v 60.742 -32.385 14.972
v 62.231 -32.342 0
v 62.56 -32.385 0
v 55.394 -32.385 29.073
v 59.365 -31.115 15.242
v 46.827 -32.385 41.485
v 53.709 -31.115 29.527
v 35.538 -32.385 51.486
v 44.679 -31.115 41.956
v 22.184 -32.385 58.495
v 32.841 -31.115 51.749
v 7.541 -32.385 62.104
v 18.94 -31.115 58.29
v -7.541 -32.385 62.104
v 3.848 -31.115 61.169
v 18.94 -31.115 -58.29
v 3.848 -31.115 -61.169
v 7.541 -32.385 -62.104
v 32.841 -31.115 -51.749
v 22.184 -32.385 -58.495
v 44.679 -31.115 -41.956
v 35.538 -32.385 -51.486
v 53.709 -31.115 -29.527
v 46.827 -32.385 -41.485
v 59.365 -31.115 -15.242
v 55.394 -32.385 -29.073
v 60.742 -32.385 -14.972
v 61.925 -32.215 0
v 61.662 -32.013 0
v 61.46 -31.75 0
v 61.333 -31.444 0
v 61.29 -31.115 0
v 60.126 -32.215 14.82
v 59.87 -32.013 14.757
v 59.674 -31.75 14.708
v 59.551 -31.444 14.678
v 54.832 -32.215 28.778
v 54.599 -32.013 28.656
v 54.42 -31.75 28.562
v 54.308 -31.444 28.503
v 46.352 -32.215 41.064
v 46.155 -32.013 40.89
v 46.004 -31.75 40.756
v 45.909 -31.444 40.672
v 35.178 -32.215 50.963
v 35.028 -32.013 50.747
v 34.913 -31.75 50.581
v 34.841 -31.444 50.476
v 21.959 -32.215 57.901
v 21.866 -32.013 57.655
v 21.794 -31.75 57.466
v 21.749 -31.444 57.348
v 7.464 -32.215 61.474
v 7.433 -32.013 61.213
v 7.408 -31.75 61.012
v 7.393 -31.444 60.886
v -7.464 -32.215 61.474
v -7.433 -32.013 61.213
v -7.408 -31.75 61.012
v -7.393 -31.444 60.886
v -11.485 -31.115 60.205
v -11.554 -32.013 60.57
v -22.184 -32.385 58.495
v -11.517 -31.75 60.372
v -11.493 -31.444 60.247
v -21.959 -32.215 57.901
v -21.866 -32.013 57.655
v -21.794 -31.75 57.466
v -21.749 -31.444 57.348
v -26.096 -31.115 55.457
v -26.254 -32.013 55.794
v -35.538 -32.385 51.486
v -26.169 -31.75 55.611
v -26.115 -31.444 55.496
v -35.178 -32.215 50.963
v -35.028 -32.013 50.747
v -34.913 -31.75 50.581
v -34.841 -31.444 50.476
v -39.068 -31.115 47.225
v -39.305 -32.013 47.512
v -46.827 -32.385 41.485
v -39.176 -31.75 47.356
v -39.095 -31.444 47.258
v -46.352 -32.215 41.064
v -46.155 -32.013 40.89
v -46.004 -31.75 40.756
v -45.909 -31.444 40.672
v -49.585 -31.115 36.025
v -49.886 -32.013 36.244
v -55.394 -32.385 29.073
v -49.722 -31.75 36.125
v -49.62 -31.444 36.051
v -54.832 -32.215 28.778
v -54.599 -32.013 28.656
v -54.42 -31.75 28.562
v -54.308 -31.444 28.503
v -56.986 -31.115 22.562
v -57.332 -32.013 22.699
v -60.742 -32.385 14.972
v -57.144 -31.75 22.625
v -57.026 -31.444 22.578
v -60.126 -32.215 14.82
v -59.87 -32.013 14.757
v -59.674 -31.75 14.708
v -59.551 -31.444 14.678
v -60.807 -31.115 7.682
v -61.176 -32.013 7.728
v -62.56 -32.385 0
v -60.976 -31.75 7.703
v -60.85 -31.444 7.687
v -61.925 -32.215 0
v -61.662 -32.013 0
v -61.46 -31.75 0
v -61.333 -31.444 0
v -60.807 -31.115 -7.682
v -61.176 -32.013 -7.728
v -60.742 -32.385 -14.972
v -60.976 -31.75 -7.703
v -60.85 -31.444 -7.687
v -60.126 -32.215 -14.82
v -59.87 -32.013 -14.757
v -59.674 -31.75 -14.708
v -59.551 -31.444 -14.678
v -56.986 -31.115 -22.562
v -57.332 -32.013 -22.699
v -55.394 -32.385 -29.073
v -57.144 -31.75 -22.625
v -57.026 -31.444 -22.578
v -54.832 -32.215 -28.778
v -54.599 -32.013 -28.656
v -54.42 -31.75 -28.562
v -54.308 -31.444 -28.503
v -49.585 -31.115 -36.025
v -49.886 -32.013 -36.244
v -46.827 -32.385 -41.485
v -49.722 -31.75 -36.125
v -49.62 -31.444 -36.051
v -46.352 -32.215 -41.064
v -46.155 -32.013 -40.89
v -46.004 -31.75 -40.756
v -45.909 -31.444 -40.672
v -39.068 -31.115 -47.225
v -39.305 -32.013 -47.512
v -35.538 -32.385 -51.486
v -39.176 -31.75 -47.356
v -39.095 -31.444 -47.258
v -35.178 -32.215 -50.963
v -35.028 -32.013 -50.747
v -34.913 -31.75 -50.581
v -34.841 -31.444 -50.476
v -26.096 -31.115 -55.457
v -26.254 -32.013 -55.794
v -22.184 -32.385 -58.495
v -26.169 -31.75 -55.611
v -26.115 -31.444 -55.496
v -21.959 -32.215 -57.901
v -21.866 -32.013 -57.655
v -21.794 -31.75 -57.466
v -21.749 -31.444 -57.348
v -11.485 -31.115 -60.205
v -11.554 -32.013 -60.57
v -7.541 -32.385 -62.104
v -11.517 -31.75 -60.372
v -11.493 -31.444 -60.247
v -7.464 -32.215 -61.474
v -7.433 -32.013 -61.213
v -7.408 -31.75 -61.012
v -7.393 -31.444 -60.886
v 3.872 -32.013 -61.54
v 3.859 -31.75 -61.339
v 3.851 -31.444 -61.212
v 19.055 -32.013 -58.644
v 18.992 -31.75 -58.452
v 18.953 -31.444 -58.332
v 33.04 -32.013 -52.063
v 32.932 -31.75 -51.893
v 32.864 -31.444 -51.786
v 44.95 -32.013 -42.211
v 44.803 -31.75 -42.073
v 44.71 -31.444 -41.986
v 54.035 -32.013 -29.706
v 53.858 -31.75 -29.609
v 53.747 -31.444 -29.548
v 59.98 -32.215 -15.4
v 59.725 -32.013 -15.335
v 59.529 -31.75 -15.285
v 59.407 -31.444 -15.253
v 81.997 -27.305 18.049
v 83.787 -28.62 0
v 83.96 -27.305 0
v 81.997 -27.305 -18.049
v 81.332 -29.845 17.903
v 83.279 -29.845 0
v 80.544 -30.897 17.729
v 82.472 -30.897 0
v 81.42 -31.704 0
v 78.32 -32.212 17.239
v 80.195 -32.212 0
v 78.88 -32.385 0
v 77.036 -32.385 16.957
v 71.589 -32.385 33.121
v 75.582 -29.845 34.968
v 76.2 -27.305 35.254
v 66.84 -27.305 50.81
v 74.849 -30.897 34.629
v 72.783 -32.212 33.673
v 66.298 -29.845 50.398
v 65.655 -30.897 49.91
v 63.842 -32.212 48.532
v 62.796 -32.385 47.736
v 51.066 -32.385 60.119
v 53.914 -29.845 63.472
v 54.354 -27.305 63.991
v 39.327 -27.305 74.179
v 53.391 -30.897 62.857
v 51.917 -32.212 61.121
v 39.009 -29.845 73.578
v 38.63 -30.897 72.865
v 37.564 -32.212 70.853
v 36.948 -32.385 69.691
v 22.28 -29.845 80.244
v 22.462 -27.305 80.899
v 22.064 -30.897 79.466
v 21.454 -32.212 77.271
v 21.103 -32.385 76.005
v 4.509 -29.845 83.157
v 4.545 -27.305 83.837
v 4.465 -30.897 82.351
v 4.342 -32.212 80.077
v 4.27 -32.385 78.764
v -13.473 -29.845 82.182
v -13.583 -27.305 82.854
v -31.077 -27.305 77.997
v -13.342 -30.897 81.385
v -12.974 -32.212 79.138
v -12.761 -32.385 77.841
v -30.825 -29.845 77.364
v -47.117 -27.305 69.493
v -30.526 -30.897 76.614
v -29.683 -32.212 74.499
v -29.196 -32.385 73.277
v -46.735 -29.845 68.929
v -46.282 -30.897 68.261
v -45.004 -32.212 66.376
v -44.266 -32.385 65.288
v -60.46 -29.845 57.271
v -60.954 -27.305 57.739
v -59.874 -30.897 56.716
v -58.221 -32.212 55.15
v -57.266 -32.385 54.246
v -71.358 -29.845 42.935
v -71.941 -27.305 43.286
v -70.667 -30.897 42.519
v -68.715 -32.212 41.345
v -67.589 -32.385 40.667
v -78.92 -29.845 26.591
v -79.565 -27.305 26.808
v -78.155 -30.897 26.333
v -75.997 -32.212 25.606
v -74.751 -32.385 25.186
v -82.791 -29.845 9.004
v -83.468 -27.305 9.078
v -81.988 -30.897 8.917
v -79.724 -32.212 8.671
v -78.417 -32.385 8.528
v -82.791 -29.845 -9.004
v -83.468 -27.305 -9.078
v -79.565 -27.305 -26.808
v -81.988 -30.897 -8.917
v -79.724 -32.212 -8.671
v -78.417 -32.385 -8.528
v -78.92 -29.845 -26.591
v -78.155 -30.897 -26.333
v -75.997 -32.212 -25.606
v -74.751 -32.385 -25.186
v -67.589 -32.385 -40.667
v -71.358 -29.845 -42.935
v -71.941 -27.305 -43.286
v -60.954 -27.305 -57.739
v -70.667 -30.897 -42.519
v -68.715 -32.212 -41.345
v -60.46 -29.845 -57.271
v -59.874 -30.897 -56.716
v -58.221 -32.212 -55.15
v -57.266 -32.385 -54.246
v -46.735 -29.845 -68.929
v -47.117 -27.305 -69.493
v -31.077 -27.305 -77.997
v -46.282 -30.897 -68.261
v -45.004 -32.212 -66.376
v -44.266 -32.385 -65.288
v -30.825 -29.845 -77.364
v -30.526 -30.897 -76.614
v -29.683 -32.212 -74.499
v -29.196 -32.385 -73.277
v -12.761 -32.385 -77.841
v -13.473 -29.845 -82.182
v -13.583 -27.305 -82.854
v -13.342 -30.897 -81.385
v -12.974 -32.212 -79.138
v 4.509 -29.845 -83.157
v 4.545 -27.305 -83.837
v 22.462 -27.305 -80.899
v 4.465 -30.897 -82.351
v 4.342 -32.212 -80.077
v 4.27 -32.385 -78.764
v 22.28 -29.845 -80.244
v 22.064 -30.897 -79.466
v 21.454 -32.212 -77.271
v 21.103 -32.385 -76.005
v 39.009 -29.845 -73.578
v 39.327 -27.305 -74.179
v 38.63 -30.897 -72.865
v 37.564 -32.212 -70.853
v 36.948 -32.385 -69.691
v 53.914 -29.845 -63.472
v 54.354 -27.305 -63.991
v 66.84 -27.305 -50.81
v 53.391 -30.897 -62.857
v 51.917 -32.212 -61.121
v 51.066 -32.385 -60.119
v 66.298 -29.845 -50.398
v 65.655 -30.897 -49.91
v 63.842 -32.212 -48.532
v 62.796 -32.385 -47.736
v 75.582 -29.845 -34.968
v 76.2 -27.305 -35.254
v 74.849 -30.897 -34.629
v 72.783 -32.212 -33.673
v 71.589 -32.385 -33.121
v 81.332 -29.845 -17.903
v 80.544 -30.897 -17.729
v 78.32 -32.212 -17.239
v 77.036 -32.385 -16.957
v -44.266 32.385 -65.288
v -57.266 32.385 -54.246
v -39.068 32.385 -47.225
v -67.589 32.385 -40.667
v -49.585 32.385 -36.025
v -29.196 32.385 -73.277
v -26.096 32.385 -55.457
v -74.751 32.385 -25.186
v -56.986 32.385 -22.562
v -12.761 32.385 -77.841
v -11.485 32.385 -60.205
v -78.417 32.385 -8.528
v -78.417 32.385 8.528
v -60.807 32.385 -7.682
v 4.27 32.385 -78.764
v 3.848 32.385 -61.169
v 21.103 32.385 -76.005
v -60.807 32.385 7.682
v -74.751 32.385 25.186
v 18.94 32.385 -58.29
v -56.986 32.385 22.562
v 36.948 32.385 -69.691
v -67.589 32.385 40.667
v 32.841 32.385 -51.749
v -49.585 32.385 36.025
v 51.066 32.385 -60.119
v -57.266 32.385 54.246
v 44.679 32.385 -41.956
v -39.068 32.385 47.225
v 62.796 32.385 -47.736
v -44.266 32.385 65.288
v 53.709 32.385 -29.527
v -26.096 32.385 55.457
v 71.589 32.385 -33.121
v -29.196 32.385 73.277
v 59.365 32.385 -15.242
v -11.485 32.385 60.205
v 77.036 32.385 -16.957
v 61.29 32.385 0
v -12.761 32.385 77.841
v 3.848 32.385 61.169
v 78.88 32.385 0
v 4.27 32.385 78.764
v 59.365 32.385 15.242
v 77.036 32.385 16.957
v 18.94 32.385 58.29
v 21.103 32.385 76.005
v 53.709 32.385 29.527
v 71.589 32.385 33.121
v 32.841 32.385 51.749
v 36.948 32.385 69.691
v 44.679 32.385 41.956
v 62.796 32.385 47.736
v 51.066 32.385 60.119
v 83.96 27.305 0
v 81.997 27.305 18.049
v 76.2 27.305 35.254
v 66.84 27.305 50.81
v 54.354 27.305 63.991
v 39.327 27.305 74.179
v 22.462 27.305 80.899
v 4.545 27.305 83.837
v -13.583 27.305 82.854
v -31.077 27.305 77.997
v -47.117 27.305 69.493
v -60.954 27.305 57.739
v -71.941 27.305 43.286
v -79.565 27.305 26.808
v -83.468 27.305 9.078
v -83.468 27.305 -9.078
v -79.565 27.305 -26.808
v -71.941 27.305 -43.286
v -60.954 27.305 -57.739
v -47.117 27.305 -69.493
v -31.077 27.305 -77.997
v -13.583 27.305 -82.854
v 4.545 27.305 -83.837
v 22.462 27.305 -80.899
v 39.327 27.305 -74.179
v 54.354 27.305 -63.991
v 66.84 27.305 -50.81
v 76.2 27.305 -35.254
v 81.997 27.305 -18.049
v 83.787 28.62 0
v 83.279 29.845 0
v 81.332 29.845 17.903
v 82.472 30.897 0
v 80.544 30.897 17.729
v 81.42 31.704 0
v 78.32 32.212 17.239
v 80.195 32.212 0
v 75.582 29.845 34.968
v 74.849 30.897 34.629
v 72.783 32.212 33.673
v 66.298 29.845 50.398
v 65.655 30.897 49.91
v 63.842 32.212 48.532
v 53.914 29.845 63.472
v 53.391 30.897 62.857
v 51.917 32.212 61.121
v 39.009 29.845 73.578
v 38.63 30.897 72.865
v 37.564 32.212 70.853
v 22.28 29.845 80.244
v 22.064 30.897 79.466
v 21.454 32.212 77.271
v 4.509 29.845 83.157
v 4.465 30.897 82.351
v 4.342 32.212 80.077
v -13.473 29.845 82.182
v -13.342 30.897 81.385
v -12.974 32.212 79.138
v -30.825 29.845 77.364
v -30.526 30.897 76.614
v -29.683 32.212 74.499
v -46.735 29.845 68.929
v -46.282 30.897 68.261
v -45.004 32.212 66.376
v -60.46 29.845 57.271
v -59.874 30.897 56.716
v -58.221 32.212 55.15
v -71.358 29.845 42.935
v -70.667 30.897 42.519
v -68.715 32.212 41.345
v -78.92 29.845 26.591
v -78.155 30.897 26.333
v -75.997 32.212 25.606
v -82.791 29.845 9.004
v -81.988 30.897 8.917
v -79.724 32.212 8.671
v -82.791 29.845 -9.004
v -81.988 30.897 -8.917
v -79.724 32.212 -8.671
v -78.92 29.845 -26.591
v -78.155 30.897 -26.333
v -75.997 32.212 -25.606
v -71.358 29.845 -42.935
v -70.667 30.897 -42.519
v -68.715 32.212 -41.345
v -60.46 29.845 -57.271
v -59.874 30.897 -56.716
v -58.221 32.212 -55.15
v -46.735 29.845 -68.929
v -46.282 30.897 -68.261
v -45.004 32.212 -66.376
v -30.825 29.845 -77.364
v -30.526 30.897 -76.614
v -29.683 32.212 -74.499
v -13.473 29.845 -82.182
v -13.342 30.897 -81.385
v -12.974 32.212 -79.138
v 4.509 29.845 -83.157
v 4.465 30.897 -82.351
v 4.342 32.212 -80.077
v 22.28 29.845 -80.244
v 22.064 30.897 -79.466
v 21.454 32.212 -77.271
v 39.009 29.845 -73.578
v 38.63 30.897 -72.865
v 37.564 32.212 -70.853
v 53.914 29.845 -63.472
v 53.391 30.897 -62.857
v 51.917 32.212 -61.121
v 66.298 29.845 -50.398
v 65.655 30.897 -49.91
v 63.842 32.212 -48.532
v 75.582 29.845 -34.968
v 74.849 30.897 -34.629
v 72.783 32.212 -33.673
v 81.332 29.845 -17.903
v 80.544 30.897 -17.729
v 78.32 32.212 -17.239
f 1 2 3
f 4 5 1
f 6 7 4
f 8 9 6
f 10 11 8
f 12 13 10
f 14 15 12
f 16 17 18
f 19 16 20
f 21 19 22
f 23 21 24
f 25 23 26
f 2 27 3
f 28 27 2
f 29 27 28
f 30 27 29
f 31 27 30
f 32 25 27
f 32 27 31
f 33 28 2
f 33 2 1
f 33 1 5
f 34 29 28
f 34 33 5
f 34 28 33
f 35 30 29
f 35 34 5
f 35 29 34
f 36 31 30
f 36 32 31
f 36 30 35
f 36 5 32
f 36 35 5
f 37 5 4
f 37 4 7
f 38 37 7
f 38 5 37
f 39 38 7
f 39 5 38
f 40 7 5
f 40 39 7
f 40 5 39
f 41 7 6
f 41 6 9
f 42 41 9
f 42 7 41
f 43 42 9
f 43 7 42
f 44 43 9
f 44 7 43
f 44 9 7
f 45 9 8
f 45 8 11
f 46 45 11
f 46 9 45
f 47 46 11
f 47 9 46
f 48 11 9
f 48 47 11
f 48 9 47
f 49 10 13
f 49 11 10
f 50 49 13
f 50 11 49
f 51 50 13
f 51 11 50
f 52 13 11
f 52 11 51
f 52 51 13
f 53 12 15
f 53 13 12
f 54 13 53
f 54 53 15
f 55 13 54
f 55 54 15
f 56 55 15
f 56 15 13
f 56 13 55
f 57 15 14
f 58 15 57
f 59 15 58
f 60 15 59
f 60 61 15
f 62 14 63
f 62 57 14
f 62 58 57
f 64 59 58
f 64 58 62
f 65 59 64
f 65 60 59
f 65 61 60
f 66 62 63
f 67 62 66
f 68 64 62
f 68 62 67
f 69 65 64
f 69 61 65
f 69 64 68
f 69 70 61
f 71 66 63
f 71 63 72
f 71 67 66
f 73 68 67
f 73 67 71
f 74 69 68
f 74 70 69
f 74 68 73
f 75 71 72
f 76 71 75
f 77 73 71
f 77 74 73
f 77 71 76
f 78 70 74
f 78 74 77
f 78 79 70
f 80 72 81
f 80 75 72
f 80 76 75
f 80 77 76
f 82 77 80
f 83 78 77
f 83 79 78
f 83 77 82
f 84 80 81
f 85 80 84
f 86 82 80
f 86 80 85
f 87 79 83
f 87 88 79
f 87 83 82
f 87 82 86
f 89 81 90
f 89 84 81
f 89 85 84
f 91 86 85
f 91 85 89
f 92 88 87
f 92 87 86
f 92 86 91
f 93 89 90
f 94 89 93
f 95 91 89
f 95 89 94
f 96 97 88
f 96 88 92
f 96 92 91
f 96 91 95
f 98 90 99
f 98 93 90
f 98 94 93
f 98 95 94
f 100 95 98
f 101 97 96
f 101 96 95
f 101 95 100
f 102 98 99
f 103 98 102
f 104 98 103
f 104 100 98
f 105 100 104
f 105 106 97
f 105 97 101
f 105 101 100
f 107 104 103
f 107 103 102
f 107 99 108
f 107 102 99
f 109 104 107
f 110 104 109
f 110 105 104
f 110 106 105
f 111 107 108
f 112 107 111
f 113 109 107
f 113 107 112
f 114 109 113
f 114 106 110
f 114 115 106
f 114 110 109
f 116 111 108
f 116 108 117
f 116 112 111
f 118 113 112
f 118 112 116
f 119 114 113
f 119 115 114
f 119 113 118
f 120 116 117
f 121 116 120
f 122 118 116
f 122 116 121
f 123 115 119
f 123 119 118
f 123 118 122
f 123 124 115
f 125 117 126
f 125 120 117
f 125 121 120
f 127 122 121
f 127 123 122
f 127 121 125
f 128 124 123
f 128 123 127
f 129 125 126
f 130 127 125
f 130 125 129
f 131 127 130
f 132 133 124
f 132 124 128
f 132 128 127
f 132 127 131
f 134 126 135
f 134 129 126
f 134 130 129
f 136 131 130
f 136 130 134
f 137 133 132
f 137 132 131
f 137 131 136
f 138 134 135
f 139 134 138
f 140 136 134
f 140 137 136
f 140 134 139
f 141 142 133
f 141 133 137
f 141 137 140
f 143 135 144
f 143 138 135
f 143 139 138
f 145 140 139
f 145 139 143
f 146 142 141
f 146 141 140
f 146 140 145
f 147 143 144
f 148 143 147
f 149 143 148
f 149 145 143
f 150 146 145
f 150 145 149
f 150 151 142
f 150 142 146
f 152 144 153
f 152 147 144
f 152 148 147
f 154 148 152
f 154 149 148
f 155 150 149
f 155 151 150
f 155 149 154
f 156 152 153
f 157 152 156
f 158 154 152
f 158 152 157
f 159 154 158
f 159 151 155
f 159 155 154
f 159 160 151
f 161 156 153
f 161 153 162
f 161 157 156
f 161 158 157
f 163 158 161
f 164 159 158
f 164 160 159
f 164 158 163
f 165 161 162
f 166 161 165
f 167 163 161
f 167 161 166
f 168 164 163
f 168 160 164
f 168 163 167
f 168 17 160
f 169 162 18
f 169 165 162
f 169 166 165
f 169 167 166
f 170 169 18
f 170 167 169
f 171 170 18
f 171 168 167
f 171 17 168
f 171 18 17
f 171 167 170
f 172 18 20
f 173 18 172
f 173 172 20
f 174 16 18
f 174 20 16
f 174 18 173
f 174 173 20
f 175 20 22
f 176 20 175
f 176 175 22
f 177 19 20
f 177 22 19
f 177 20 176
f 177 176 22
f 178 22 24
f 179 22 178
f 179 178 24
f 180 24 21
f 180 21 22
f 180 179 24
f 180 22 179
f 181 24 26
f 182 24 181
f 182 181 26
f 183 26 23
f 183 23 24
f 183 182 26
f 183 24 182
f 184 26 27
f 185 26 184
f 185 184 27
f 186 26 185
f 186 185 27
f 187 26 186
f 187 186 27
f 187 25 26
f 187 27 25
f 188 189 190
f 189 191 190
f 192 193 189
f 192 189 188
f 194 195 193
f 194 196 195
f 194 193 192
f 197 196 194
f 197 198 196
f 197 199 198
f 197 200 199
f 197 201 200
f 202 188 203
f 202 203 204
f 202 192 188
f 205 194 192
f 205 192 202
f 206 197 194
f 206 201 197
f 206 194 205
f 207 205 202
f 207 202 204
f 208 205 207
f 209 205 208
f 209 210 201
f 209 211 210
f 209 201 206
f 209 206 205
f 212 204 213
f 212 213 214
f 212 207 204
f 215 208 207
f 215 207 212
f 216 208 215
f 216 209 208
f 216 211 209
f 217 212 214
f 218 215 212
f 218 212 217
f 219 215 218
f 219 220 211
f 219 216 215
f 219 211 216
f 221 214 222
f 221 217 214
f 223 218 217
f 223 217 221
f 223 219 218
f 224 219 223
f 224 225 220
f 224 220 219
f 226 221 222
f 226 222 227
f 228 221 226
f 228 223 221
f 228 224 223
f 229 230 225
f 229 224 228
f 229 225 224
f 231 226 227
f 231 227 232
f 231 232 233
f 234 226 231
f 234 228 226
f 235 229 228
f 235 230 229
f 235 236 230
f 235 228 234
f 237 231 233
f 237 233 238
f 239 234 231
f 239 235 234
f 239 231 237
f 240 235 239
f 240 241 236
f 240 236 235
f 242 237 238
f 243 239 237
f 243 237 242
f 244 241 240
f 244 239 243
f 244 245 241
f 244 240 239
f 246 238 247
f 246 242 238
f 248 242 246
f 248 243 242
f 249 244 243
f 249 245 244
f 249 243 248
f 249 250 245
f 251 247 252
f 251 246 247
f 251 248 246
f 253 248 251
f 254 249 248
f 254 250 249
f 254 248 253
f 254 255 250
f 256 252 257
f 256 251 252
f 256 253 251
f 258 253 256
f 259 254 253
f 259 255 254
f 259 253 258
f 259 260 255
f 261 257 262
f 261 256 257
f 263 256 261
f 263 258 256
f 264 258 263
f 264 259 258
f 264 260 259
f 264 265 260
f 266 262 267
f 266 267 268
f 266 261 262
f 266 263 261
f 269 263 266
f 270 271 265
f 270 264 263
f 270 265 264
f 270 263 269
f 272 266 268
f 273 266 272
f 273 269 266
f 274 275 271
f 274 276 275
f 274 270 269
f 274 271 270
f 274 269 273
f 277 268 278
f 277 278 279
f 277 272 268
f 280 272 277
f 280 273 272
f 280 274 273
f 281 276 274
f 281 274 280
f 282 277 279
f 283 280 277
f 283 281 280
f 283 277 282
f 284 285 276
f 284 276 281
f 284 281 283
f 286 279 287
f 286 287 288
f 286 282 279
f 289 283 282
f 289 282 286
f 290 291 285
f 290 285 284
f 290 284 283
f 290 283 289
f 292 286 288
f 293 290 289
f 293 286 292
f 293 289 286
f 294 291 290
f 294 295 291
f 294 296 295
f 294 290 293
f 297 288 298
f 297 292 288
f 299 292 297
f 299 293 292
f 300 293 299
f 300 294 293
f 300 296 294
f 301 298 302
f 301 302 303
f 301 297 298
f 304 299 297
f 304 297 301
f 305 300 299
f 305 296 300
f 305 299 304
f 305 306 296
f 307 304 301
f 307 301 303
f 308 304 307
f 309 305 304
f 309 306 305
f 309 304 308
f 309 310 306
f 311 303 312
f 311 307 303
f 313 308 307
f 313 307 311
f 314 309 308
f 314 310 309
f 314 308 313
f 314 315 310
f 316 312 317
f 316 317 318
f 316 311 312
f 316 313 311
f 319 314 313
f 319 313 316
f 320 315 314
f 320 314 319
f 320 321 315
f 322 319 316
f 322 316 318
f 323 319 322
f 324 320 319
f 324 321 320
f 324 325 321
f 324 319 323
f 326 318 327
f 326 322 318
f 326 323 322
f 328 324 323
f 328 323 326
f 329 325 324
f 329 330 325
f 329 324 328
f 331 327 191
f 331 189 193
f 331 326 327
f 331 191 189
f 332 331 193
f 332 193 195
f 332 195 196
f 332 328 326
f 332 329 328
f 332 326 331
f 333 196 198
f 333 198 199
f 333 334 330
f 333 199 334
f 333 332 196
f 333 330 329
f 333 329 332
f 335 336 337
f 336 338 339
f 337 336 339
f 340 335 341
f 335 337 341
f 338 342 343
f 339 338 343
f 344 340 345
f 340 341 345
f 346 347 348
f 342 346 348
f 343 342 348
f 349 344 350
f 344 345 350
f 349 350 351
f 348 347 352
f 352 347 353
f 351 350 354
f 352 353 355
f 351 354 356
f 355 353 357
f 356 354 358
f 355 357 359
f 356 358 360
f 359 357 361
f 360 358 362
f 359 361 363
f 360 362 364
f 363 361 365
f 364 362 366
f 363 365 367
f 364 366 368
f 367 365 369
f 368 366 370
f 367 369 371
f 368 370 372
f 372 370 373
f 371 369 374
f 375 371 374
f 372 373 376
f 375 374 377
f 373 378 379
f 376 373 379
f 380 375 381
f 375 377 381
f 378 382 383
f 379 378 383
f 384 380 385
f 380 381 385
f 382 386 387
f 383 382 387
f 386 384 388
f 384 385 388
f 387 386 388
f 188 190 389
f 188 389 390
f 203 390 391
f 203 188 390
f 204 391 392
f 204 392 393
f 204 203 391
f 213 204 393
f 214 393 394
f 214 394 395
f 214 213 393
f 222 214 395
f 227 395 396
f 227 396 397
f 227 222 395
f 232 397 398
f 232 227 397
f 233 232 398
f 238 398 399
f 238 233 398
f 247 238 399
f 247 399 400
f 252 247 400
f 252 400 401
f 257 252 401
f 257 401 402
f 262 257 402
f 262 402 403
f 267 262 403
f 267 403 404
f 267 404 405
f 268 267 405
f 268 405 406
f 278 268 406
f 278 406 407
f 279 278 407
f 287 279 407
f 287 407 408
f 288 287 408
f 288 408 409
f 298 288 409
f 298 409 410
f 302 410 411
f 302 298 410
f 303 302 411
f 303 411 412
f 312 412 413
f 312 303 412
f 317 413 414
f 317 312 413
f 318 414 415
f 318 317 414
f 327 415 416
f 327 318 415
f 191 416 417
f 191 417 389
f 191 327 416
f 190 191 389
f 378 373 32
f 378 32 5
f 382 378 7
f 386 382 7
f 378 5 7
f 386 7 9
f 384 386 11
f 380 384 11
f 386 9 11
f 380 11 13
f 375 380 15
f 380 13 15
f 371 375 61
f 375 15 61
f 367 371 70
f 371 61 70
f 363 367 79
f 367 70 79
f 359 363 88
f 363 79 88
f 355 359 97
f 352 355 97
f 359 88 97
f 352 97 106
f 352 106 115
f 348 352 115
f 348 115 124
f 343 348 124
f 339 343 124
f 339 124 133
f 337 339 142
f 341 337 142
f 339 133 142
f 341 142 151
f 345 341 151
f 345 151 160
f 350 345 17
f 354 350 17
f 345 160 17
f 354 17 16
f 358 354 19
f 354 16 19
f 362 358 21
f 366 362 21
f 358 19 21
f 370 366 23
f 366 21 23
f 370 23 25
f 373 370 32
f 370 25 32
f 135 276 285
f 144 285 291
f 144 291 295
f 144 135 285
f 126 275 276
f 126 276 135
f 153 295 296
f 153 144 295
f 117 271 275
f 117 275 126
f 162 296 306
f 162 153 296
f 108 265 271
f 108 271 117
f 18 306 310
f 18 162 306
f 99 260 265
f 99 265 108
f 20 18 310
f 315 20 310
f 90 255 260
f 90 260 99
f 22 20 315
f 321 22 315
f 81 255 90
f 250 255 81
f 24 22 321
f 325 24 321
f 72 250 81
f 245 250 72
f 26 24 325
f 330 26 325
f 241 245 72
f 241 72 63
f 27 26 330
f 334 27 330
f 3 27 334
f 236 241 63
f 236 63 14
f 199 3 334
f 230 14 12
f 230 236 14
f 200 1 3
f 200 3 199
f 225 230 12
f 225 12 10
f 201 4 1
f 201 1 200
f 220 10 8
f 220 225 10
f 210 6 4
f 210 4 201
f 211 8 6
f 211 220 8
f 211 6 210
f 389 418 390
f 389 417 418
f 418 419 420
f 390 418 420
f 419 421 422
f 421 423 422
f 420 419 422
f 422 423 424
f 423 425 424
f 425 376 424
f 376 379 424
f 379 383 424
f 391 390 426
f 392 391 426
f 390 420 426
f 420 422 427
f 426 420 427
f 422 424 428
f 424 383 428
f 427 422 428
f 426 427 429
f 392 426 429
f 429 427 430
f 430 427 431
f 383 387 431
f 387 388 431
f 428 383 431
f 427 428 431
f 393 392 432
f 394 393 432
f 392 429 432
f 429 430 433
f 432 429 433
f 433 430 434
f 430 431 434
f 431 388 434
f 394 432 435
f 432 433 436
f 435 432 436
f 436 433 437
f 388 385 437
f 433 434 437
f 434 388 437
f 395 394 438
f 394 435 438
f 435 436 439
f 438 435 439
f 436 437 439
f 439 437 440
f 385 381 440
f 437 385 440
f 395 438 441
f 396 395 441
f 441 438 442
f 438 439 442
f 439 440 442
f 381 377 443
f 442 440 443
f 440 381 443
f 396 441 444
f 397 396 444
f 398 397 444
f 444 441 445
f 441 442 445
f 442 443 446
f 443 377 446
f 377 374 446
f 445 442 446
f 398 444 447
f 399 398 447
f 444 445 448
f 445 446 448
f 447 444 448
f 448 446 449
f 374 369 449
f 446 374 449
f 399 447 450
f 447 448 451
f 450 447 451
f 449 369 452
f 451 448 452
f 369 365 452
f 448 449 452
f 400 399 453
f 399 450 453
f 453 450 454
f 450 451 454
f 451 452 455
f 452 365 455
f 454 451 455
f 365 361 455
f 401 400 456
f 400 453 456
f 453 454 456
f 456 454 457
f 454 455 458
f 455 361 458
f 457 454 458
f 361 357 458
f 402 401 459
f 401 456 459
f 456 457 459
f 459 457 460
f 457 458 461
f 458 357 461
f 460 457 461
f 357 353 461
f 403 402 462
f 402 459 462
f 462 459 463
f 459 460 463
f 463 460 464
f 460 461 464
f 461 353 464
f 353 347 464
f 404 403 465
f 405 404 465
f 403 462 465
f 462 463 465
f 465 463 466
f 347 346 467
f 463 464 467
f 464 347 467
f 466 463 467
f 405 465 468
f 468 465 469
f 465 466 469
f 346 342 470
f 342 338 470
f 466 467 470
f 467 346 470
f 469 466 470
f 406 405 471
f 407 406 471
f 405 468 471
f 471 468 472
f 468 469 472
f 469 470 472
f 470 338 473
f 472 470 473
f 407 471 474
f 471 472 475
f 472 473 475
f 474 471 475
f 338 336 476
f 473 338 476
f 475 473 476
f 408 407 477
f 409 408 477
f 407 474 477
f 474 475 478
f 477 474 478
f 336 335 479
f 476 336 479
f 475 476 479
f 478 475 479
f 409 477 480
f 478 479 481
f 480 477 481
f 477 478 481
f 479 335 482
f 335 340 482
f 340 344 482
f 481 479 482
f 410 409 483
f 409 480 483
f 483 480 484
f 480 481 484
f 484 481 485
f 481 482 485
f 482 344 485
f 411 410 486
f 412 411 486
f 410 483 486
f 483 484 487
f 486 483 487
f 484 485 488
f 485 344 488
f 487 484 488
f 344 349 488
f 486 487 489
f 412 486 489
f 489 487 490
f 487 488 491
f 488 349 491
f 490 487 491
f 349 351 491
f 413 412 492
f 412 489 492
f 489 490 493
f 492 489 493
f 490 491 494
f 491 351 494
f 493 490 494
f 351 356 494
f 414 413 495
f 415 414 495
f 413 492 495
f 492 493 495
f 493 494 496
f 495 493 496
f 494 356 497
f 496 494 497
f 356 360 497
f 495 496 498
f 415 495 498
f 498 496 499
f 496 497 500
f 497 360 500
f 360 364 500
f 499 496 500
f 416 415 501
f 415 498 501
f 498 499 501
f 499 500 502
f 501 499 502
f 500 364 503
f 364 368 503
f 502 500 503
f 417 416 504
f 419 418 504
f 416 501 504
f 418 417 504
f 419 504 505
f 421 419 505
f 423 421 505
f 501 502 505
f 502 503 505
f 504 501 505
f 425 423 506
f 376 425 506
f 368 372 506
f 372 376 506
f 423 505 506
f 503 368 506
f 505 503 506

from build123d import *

# Parameters (mm, degrees)
F0_R     = 83.9597
F1_DEPTH = 32.385
F2_R     = 61.2902
F3_DEPTH = 50.8
F4_R     = 5.08
F5_R     = 1.27


with BuildPart() as f1:
    # F0 (on Front) → F1 (new body, symmetric)
    with BuildSketch(Plane.XZ):
        Circle(F0_R)
    extrude(amount=F1_DEPTH, both=True)

    # F2 (on Front) → F3 (cut, symmetric)
    with BuildSketch(Plane.XZ):
        Circle(F2_R)
    extrude(amount=F3_DEPTH, both=True, mode=Mode.SUBTRACT)

    # F4
    f4_edges = [f1.edges().sort_by_distance(p)[0] for p in [
        (-83.9597, -32.385, 0),
        (-83.9597, 32.385, 0),
    ]]
    fillet(f4_edges, radius=F4_R)

    # F5
    f5_edges = [f1.edges().sort_by_distance(p)[0] for p in [
        (-61.2902, -32.385, 0),
    ]]
    fillet(f5_edges, radius=F5_R)


solid = f1.part
